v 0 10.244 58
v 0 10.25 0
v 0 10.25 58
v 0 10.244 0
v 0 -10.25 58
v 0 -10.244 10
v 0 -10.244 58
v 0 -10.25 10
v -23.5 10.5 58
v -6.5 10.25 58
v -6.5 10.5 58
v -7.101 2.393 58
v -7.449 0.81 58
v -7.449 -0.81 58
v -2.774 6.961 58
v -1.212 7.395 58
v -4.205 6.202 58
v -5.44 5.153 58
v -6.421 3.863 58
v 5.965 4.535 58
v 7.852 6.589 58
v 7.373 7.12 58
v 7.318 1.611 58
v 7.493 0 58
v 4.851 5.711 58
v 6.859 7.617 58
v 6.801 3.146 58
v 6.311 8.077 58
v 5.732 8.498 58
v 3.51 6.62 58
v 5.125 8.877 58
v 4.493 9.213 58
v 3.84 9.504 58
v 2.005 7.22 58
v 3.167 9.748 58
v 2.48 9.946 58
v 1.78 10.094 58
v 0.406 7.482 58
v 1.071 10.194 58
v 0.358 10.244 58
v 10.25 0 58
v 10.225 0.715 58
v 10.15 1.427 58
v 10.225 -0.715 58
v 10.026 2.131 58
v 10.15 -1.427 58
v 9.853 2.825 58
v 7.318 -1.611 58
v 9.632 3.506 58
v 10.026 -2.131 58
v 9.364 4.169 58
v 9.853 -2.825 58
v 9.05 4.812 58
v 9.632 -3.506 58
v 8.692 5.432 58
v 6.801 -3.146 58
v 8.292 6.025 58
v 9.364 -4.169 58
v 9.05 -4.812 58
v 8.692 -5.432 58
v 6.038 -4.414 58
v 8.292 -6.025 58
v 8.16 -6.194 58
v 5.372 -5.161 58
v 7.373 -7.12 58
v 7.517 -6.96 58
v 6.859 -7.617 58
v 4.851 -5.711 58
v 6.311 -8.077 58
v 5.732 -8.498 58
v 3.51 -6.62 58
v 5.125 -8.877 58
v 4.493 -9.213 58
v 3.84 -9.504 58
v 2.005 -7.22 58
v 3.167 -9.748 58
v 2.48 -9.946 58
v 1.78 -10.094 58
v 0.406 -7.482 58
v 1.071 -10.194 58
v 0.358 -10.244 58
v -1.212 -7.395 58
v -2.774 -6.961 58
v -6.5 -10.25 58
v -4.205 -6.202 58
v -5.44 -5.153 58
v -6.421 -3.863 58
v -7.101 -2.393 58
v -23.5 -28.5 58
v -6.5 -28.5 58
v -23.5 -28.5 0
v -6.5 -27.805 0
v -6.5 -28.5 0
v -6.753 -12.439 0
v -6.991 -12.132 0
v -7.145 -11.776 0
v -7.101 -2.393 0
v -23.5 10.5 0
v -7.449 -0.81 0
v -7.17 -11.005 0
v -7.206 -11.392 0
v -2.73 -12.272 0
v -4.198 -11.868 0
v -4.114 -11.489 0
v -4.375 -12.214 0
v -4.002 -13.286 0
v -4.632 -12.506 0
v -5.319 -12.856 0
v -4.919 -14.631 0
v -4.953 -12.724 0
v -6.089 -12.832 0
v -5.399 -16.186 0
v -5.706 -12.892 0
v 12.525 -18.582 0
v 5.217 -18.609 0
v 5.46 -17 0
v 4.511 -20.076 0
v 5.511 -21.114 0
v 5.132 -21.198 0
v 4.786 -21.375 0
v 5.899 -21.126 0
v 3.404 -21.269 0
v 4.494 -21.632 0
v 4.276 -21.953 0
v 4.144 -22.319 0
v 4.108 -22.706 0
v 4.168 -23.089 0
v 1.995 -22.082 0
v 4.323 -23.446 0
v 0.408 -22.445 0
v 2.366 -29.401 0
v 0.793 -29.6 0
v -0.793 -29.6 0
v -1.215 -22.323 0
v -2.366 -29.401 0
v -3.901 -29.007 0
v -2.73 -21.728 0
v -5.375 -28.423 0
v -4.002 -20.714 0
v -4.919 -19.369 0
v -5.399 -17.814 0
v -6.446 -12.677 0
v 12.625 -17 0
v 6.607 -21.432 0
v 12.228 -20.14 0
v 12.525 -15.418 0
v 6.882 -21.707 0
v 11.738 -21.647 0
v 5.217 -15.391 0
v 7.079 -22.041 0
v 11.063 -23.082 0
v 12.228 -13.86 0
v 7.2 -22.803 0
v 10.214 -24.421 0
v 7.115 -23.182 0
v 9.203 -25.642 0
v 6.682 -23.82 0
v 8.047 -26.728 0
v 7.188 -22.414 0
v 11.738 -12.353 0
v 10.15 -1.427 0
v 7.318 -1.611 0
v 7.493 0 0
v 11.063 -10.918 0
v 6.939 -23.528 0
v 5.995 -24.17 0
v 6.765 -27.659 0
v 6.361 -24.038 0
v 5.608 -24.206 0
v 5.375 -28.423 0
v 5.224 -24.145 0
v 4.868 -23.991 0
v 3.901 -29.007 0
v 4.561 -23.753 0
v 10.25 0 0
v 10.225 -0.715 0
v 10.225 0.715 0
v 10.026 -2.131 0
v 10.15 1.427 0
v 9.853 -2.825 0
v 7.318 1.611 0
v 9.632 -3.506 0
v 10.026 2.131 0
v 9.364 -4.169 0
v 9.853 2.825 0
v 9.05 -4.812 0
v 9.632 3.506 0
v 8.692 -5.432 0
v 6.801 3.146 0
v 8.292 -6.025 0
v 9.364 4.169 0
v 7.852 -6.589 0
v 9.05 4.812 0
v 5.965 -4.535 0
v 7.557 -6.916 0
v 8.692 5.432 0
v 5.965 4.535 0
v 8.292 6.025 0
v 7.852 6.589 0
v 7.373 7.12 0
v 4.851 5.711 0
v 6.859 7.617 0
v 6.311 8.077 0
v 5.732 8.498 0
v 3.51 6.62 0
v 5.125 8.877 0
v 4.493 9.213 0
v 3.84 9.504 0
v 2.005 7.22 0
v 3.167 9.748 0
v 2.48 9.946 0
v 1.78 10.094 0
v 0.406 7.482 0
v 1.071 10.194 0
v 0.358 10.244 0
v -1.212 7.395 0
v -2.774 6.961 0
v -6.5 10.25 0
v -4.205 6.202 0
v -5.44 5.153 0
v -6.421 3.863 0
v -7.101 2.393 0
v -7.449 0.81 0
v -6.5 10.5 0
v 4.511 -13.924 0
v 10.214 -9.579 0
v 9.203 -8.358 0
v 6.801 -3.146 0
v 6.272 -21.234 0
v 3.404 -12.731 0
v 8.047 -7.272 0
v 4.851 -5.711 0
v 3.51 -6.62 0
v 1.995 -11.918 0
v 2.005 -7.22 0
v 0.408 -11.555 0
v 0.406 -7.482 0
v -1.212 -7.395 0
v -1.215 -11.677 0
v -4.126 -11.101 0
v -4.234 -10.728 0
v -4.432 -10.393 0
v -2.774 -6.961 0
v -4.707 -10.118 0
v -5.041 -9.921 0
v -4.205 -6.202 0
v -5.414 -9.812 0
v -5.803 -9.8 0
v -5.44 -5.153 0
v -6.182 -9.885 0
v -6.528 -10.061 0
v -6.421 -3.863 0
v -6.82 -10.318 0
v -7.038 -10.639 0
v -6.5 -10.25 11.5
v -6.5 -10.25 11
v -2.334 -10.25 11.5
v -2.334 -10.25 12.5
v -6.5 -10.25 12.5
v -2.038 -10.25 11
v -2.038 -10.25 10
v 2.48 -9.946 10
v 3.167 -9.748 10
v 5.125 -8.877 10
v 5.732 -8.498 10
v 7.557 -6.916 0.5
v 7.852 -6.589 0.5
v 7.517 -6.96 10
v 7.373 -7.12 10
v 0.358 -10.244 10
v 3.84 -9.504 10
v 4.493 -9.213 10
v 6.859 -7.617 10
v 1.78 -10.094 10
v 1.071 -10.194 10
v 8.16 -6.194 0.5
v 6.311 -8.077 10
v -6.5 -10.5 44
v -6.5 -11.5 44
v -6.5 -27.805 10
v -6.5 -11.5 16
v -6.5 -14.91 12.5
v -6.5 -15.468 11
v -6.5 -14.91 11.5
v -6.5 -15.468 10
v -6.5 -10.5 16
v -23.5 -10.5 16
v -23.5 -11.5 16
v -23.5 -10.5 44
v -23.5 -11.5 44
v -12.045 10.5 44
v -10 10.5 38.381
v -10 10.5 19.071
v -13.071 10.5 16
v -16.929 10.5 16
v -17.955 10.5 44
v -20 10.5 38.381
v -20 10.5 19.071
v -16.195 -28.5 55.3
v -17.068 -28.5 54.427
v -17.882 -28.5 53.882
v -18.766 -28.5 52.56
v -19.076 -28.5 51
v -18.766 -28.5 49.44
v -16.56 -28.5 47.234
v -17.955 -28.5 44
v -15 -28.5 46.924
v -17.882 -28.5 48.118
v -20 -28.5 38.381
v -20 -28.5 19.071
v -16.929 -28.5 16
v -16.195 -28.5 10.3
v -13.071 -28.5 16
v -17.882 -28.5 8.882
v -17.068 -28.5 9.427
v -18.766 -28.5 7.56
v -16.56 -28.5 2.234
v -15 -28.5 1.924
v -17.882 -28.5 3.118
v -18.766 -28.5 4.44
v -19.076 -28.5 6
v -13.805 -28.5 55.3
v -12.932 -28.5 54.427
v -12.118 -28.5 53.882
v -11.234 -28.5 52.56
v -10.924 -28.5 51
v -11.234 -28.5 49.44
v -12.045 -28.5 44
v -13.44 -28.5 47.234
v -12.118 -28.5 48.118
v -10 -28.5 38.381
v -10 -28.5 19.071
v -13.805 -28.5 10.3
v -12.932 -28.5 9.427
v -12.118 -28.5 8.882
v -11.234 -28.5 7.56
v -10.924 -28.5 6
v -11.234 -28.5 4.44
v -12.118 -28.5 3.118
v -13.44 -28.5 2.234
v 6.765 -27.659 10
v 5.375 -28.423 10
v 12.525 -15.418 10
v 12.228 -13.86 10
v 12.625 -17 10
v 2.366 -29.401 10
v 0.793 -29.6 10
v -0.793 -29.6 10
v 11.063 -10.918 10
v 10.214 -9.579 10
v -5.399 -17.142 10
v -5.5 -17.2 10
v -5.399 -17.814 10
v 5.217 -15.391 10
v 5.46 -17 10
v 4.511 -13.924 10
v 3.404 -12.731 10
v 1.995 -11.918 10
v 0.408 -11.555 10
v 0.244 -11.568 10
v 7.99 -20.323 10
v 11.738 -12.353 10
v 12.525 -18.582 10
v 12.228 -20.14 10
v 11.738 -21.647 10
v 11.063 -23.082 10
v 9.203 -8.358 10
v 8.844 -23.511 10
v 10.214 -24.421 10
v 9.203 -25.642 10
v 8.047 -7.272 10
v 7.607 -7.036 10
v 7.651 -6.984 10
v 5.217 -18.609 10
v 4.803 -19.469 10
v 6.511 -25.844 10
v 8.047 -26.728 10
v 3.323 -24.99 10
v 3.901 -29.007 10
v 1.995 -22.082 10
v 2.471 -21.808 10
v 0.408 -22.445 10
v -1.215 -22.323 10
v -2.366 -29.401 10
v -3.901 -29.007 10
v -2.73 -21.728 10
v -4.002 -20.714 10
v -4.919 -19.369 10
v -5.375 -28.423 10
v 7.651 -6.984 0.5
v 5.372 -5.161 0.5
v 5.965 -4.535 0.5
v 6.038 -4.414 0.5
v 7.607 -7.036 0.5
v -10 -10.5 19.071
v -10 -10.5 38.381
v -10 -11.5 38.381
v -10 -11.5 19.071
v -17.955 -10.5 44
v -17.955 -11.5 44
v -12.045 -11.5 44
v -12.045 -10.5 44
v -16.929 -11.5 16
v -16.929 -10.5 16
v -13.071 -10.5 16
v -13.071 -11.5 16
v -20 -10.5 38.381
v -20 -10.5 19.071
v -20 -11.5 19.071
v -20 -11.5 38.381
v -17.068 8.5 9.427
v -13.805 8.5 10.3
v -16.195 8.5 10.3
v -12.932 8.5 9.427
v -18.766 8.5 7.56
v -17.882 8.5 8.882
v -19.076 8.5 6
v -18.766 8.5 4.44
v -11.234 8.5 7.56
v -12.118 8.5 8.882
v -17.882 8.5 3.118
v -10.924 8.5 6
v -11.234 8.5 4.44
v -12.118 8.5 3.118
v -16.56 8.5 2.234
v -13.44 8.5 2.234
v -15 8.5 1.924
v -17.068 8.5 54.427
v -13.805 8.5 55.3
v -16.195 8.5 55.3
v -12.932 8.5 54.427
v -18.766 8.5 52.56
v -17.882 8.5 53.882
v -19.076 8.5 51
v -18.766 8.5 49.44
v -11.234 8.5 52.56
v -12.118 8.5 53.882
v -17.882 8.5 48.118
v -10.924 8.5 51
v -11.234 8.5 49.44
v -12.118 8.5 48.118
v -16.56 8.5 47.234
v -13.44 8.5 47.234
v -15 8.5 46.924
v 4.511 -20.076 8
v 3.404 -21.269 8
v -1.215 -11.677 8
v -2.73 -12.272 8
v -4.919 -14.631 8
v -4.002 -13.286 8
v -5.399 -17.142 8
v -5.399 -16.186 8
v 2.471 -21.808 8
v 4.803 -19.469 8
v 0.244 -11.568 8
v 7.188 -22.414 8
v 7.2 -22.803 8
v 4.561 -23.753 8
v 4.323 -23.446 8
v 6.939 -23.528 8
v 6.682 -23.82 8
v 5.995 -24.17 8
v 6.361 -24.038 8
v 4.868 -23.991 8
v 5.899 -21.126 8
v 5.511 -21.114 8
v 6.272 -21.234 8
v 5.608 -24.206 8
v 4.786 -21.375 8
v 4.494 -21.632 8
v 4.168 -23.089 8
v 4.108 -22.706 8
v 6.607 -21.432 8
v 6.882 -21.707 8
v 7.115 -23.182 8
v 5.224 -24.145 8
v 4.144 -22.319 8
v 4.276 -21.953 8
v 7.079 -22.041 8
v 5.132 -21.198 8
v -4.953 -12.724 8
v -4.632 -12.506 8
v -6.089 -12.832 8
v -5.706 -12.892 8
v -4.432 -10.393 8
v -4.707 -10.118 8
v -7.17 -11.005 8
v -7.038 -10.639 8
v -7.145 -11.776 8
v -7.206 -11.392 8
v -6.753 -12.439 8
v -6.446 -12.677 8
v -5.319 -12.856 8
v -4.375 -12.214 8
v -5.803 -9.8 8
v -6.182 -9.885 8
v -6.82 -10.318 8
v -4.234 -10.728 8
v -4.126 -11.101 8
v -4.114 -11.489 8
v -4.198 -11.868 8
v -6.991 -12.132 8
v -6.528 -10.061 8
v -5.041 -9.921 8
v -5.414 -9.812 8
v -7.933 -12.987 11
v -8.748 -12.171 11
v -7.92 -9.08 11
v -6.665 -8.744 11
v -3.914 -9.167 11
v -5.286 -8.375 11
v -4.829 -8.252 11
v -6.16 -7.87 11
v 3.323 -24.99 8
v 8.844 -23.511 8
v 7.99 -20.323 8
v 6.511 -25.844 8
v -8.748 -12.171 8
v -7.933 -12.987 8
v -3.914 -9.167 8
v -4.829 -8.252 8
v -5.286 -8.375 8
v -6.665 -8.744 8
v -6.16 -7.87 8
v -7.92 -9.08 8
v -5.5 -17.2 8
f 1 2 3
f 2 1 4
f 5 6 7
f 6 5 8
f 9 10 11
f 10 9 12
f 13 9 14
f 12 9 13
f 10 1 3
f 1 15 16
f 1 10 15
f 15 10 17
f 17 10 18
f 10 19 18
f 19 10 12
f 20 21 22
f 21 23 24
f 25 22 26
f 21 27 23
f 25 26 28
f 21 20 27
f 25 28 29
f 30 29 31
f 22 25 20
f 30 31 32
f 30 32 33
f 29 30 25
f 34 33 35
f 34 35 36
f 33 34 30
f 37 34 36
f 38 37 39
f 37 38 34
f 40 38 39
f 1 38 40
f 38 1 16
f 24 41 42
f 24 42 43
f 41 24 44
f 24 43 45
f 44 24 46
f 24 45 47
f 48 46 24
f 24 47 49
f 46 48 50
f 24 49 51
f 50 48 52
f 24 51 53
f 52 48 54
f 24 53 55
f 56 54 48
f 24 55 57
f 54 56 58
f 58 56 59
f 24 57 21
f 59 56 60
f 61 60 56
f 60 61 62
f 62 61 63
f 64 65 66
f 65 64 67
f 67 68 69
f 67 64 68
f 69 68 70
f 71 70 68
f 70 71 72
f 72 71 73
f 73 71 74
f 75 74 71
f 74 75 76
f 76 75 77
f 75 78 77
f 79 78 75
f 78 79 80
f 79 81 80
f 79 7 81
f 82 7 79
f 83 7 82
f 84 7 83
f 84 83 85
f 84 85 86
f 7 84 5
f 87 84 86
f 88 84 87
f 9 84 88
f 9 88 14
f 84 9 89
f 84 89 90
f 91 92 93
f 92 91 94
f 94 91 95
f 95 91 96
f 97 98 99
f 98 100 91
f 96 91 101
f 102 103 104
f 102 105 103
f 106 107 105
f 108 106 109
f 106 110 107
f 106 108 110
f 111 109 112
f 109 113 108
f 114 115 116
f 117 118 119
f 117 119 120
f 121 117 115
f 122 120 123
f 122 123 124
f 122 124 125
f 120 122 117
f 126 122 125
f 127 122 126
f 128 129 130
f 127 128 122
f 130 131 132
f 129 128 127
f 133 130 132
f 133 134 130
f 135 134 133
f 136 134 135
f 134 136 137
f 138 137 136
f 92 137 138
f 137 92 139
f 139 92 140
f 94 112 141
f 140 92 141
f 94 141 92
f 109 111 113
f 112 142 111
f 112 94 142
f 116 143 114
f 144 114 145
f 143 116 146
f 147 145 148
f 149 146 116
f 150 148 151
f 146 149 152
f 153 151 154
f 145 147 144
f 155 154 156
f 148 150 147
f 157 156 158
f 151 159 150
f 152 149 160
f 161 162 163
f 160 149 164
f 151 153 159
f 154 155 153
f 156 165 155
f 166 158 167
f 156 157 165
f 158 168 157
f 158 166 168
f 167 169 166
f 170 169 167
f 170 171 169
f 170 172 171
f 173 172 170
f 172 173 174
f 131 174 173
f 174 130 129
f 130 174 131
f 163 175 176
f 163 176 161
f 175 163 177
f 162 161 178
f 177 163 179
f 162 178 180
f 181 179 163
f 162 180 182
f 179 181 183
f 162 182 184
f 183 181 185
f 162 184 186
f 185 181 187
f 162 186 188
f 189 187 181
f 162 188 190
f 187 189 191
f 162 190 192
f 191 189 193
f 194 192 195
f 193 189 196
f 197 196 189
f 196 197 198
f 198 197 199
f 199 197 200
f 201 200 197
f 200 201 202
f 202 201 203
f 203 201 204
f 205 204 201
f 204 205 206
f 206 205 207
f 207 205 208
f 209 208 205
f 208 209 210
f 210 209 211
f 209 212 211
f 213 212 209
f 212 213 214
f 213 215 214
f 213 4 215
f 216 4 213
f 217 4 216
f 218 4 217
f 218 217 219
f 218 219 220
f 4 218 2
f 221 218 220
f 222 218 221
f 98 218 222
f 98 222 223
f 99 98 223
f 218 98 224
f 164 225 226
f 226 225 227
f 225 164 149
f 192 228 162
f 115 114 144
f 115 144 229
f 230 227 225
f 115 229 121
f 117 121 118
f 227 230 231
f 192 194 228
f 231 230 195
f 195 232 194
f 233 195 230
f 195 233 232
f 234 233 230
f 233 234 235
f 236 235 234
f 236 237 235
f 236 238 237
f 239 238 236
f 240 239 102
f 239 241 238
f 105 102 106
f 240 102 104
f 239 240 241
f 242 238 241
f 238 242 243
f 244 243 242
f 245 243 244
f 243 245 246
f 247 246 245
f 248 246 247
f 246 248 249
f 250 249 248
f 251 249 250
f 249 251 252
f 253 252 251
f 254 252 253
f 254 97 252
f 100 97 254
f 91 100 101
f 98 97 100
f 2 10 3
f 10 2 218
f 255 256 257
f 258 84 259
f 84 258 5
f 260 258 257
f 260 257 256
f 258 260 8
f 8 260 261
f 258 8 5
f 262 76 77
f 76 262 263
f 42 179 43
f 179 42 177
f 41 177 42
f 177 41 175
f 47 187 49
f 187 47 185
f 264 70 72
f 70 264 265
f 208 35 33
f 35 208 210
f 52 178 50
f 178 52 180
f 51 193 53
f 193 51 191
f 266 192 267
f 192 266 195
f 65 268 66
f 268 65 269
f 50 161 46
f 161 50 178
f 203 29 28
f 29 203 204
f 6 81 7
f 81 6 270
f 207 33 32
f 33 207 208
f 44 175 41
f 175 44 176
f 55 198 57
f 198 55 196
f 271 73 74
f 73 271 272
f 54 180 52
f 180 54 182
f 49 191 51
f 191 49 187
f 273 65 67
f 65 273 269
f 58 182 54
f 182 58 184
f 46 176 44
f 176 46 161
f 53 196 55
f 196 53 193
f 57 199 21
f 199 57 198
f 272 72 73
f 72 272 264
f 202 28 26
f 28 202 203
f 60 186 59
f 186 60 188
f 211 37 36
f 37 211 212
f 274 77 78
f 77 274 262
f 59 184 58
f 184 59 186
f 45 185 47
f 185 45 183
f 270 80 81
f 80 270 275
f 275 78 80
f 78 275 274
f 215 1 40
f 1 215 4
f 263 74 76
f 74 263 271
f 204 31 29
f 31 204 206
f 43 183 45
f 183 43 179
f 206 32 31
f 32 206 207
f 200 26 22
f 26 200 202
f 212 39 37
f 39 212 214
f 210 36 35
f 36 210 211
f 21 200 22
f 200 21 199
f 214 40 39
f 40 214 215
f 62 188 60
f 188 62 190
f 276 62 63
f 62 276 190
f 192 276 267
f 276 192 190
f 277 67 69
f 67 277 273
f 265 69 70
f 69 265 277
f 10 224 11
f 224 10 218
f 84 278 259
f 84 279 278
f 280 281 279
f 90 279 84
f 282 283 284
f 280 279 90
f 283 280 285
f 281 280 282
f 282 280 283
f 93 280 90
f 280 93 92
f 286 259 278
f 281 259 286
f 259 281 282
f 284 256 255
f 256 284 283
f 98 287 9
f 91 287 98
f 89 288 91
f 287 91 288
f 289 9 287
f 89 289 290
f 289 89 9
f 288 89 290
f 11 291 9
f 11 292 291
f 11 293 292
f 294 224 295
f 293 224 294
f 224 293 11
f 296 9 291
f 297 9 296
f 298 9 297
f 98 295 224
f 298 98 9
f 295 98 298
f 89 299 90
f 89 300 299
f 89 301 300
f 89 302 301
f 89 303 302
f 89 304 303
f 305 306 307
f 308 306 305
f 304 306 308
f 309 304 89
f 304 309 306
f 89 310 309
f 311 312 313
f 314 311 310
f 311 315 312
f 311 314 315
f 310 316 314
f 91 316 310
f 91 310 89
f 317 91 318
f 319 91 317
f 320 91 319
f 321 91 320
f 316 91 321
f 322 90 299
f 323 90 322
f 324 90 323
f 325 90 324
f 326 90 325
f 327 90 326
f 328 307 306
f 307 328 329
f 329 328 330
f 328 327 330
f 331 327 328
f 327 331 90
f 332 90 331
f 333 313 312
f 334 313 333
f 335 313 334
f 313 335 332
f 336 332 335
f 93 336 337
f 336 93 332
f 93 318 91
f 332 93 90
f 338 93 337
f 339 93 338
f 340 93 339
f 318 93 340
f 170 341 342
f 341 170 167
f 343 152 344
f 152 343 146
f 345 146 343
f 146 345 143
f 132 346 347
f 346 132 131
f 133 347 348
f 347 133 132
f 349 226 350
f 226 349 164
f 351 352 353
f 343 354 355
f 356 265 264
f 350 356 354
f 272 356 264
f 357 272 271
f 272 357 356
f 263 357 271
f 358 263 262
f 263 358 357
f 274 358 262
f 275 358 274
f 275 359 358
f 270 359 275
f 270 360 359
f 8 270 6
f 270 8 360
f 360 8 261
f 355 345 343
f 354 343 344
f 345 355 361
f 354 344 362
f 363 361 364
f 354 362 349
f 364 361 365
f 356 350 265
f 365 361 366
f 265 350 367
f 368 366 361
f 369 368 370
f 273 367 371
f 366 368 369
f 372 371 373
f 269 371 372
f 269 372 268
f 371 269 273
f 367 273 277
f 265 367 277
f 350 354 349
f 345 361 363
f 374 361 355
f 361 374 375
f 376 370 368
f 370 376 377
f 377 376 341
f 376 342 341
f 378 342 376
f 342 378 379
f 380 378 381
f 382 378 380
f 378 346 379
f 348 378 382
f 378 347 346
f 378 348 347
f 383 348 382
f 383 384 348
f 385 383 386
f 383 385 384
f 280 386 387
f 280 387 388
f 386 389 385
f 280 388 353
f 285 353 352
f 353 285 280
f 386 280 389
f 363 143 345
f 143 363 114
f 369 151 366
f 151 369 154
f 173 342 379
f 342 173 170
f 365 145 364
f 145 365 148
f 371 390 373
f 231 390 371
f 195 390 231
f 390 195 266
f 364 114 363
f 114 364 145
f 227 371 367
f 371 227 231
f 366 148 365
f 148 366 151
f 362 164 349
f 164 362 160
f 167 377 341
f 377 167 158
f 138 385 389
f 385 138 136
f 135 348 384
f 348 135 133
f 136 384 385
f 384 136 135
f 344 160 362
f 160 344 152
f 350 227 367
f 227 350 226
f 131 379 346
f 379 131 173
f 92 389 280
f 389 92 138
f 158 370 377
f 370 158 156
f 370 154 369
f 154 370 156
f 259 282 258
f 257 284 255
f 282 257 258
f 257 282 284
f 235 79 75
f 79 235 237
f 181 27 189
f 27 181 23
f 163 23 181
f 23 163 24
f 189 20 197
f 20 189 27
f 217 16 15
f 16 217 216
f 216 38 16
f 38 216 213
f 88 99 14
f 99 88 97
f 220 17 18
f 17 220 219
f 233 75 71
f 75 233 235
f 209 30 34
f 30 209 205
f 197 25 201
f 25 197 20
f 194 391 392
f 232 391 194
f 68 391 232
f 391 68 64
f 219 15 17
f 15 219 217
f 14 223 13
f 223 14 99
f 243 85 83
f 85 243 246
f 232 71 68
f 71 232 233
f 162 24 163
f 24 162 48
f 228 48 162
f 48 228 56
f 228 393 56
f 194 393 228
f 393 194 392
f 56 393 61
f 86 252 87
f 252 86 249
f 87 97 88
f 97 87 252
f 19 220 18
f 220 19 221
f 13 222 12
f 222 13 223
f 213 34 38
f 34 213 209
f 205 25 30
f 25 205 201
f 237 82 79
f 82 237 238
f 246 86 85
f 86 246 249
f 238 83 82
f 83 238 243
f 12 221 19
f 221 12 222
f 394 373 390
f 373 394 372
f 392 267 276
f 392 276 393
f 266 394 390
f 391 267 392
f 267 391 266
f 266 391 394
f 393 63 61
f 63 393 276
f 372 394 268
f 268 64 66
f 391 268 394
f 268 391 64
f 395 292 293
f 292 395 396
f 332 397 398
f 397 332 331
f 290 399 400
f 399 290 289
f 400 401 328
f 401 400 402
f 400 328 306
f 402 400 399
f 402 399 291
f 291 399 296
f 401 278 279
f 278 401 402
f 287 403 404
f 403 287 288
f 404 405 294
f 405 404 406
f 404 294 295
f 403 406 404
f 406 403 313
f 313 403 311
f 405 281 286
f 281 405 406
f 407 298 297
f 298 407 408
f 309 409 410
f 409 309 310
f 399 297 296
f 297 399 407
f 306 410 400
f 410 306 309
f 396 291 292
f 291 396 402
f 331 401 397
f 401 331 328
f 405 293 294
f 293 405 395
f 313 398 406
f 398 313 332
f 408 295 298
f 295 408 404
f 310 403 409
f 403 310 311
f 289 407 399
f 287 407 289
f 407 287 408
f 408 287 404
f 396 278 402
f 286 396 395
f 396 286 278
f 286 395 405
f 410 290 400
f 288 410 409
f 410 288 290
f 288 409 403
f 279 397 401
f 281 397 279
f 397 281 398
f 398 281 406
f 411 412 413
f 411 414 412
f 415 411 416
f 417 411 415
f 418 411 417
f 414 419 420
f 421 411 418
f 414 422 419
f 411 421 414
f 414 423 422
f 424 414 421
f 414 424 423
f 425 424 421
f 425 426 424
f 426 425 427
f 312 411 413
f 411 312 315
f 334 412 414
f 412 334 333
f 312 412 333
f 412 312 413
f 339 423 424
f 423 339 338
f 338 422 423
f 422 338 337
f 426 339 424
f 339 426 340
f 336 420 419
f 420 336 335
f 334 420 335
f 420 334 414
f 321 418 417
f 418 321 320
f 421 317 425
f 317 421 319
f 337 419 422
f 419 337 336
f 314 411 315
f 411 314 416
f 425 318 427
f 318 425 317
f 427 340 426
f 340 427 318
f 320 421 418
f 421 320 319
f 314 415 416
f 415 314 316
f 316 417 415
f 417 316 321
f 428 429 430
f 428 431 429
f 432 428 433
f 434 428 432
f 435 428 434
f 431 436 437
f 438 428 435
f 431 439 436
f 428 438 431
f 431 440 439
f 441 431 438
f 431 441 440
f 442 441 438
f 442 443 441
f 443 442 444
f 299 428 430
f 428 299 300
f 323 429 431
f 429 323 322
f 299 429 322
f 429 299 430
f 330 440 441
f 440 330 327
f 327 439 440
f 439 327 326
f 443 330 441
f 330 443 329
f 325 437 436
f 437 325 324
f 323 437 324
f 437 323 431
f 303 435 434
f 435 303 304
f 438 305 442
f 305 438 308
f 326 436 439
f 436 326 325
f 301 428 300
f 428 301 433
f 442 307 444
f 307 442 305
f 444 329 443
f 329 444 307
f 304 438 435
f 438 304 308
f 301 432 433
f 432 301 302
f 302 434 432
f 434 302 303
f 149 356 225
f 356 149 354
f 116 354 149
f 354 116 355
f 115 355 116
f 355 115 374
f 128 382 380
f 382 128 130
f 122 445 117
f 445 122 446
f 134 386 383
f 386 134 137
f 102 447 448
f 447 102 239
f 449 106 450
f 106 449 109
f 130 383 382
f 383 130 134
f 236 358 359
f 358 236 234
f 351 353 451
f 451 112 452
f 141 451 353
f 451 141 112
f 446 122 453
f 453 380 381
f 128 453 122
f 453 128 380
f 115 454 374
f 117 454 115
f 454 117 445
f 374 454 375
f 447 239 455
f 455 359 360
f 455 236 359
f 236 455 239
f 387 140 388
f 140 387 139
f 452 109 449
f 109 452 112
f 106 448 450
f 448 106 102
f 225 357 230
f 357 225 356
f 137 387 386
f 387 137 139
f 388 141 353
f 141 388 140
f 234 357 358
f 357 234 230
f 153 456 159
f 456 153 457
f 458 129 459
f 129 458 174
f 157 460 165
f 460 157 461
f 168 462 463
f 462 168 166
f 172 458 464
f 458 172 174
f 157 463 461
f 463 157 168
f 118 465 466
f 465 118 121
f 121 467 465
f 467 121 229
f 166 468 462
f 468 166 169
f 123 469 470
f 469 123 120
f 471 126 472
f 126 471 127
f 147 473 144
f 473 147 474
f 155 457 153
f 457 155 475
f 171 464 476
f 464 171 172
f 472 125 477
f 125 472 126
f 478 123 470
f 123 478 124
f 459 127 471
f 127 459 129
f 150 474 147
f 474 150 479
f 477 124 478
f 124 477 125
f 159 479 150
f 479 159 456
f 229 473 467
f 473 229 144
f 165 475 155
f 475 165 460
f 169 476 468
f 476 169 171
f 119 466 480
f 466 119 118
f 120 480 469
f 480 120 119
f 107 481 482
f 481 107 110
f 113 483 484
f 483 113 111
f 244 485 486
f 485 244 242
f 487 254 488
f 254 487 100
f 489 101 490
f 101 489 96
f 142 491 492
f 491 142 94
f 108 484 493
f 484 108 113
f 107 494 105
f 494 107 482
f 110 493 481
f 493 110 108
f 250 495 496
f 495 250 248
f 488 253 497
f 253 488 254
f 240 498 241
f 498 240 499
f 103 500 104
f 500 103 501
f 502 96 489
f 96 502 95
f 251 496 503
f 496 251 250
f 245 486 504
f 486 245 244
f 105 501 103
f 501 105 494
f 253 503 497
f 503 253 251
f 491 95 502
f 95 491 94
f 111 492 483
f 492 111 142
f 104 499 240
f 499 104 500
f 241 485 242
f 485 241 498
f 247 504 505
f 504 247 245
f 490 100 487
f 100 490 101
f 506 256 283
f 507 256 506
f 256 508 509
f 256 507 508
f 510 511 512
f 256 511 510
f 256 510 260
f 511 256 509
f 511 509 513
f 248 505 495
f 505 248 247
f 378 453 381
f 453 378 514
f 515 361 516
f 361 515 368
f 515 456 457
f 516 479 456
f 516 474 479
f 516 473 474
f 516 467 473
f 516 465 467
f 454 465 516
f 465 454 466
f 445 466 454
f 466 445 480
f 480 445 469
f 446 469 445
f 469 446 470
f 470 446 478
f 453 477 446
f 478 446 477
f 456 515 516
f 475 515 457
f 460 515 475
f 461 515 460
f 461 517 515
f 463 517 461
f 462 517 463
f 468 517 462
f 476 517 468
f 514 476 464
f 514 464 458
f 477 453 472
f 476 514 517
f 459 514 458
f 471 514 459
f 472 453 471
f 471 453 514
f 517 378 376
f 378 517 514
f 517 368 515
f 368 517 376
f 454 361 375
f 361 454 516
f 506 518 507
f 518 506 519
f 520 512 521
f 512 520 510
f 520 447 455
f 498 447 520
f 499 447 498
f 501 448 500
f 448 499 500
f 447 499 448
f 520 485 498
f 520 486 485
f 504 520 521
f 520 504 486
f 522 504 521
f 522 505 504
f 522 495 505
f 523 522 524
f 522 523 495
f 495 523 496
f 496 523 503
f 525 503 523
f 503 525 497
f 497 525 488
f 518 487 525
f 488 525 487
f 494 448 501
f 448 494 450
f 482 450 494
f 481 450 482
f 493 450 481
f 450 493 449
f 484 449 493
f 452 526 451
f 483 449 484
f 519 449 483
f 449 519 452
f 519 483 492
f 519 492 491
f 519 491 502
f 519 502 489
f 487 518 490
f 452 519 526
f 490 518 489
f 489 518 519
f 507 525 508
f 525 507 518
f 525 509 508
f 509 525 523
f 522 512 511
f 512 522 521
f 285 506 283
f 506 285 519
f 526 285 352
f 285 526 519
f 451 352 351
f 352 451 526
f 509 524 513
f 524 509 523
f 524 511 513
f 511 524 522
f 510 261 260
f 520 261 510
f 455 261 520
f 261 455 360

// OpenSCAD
// file: polyholes.scad
//
// Mendel90
//
// GNU GPL v2
// nop.head@gmail.com
// hydraraptor.blogspot.com
//
// See http://hydraraptor.blogspot.com/2011/02/polyholes.html
//
function sides(r) = max(round(4 *r),3);
function correctedRadius(r,n) = 0.1 + r / cos(180 / n);
function correctedDiameter(d) = 0.2 + d / cos(180 / sides(d / 2));

module polyCircle(r, center = false) {
    n = sides(r);
    circle(r = correctedRadius(r,n), $fn = n, center = center);
}

module poly_circle(r, center = false) {
	polyCircle(r, center);
}

module polyCylinder(r, h, center = false) {
    n = sides(r);
    cylinder(h = h, r = correctedRadius(r,n), $fn = n, center = center);
}

module poly_cylinder(r, h, center = false) {
	polyCylinder(r,h,center);
}

module polydCylinder(r, center = false) {
    n = sides(r);
    r = correctedRadius(r,n);
    cylinder(h = h, r = r, $fn = n, center = center);
    translate([0, -r, 0])
        cube([r, 2 * r, h]);
}

module poly_d_cylinder(r, center = false) {
	polydCylinder(r,center);
}
// file: bearing.scad
// PRUSA iteration3
// Bearing holders
// GNU GPL v3
// Josef Průša <iam@josefprusa.cz> and contributors
// http://www.reprap.org/wiki/Prusa_Mendel
// http://prusamendel.org

use <polyholes.scad>

bearing_diameter = 14.5;

module horizontal_bearing_base(bearings=1){
 translate(v=[0,0,6]) cube(size = [24,8+bearings*25,12], center = true);	
}
module horizontal_bearing_holes(bearings=1){
 cutter_lenght = 10+bearings*25;
 one_holder_lenght = 8+25;
 holder_lenght = 8+bearings*25;
 
 // Main bearing cut
 difference(){
  translate(v=[0,0,12]) rotate(a=[90,0,0]) translate(v=[0,0,-cutter_lenght/2]) cylinder(h = cutter_lenght, r=(bearing_diameter/2)+0.2, $fn=50);
  // Bearing retainers
  translate(v=[0,1-holder_lenght/2,3]) cube(size = [24,6,8], center = true);
  translate(v=[0,-1+holder_lenght/2,3]) cube(size = [24,6,8], center = true);
 }
 
 // Ziptie cutouts
 ziptie_cut_ofset = 0;
 for ( i = [0 : bearings-1] ){
  // For easier positioning I move them by half of one 
  // bearing holder then add each bearign lenght and then center again
  translate(v=[0,-holder_lenght/2,0]) translate(v=[0,one_holder_lenght/2+i*25,0]) difference(){
   union(){
    translate(v=[0,2-8.5,12]) rotate(a=[90,0,0]) translate(v=[0,0,0]) cylinder(h = 4, r=11.5, $fn=50);
    translate(v=[0,2+8.5,12]) rotate(a=[90,0,0]) translate(v=[0,0,0]) cylinder(h = 4, r=11.5, $fn=50);
   }
   translate(v=[0,12,12]) rotate(a=[90,0,0]) translate(v=[0,0,0]) cylinder(h = 24, r=9, $fn=50);
  }
 }
 
}

module horizontal_bearing_test(){
 difference(){
  horizontal_bearing_base(1);
  horizontal_bearing_holes(1);
 }
 translate(v=[30,0,0]) difference(){
  horizontal_bearing_base(2);
  #horizontal_bearing_holes(2);
 }
 translate(v=[60,0,0]) difference(){
  horizontal_bearing_base(3);
  horizontal_bearing_holes(3);
 }
}



thinwall = 3;
bearing_size = bearing_diameter + 2 * thinwall;

module vertical_bearing_base(){
 translate(v=[-2-bearing_size/4,0,29]) cube(size = [4+bearing_size/2,bearing_size,58], center = true);
 cylinder(h = 58, r=bearing_size/2, $fn = 90);
}

module vertical_bearing_holes(){
  translate(v=[0,0,-1]) poly_cylinder(h = 62, r=(bearing_diameter/2)+0.1);
  rotate(a=[0,0,-40]) translate(v=[bearing_diameter/2-2.9,-0.5,0.5]) cube(size = [thinwall*2,1,62]);

}

//difference(){
vertical_bearing_base();
vertical_bearing_holes();
//}
//horizontal_bearing_test();
//horizontal_bearing_base(1);
//horizontal_bearing_holes(1);
// main file
// PRUSA iteration3
// X end prototype
// GNU GPL v3
// Josef Průša <iam@josefprusa.cz> and contributors
// http://www.reprap.org/wiki/Prusa_Mendel
// http://prusamendel.org

use <bearing.scad>
use <polyholes.scad>
rod_distance = 45;

module x_end_base(){
// Main block
height = 58;
translate(v=[-15,-9,height/2]) cube(size = [17,39,height], center = true);
// Bearing holder
 vertical_bearing_base();	
//Nut trap
 // Cylinder
   translate(v=[0,-17,0]) poly_cylinder(h = 10, r=12.5, $fn=25);
 // Hexagon
 //translate(v=[0,-17,0]) rotate([0,0,30]) cylinder(h = 8, r=8, $fn = 6);
 translate(v=[-6,-10.6,12]) rotate([0,0,48.2]) cube(size = [10,5,1], center = true);
}

module x_end_holes(){
 vertical_bearing_holes();
// Belt hole
translate(v=[-1,0,0]){
// Stress relief
translate(v=[-5.5-10+1.5,-10-1,30]) cube(size = [18,1,28], center = true);
difference(){
	translate(v=[-5.5-10+1.5,-10,30]) cube(size = [10,46,28], center = true);

	

	// Nice edges
	translate(v=[-5.5-10+1.5-5,-10,30+23]) rotate([0,20,0]) cube(size = [10,46,28], center = true);
	translate(v=[-5.5-10+1.5+5,-10,30+23]) rotate([0,-20,0]) cube(size = [10,46,28], center = true);
	translate(v=[-5.5-10+1.5,-10,30-23]) rotate([0,45,0]) cube(size = [10,46,28], center = true);
	translate(v=[-5.5-10+1.5,-10,30-23]) rotate([0,-45,0]) cube(size = [10,46,28], center = true);

}
}

// Bottom pushfit rod
translate(v=[-15,-41.5,6]) rotate(a=[-90,0,0]) pushfit_rod(7.8,50);
// Top pushfit rod
translate(v=[-15,-41.5,rod_distance+6]) rotate(a=[-90,0,0]) pushfit_rod(7.8,50);

// TR Nut trap
   // Hole for the nut
   // Modification by dulouie for TR8
    translate(v=[0,-17, -1]) poly_cylinder(h = 11.01, r = 5.3, $fn = 25); 

// Screw holes for TR nut
    // Modification by dulouie for TR8
    translate(v=[0,-17, 0]) rotate([0, 0, -135]) translate([0, 8, -1]) cylinder(h = 12, r = 1.55, $fn=25);
    translate(v=[0,-17, 0]) rotate([0, 0, -135]) translate([0, -8, -1]) cylinder(h = 12, r = 1.55, $fn=25);

// Nut traps for TR nut screws
    // Modification by dulouie for TR8
    translate(v=[0,-17, 0]) rotate([0, 0, -135]) translate([0, 8, 8]) rotate([0, 0, 0])cylinder(h = 3, r = 3.3, $fn=6);

    translate(v=[0,-17, 0]) rotate([0, 0, -135]) translate([0, -8, 8]) rotate([0, 0, 30])cylinder(h = 3, r = 3.2, $fn=6);
    translate([-5.5,-17.2,8]) rotate([0,0,30]) cube([5,5,3]);
    translate([-0,-17.2,8]) rotate([0,0,60]) cube([5,10,3]);
}


// Final prototype
module x_end_plain(){
 difference(){
  x_end_base();
  x_end_holes();
 }
}

x_end_plain();


module pushfit_rod(diameter,length){
 poly_cylinder(h = length, r=diameter/2);
 difference(){
 	translate(v=[0,-diameter/2.85,length/2]) rotate([0,0,45]) cube(size = [diameter/2,diameter/2,length], center = true);
 	translate(v=[0,-diameter/4-diameter/2-0.4,length/2]) rotate([0,0,0]) cube(size = [diameter,diameter/2,length], center = true);
 }
 //translate(v=[0,-diameter/2-2,length/2]) cube(size = [diameter,1,length], center = true);
}
